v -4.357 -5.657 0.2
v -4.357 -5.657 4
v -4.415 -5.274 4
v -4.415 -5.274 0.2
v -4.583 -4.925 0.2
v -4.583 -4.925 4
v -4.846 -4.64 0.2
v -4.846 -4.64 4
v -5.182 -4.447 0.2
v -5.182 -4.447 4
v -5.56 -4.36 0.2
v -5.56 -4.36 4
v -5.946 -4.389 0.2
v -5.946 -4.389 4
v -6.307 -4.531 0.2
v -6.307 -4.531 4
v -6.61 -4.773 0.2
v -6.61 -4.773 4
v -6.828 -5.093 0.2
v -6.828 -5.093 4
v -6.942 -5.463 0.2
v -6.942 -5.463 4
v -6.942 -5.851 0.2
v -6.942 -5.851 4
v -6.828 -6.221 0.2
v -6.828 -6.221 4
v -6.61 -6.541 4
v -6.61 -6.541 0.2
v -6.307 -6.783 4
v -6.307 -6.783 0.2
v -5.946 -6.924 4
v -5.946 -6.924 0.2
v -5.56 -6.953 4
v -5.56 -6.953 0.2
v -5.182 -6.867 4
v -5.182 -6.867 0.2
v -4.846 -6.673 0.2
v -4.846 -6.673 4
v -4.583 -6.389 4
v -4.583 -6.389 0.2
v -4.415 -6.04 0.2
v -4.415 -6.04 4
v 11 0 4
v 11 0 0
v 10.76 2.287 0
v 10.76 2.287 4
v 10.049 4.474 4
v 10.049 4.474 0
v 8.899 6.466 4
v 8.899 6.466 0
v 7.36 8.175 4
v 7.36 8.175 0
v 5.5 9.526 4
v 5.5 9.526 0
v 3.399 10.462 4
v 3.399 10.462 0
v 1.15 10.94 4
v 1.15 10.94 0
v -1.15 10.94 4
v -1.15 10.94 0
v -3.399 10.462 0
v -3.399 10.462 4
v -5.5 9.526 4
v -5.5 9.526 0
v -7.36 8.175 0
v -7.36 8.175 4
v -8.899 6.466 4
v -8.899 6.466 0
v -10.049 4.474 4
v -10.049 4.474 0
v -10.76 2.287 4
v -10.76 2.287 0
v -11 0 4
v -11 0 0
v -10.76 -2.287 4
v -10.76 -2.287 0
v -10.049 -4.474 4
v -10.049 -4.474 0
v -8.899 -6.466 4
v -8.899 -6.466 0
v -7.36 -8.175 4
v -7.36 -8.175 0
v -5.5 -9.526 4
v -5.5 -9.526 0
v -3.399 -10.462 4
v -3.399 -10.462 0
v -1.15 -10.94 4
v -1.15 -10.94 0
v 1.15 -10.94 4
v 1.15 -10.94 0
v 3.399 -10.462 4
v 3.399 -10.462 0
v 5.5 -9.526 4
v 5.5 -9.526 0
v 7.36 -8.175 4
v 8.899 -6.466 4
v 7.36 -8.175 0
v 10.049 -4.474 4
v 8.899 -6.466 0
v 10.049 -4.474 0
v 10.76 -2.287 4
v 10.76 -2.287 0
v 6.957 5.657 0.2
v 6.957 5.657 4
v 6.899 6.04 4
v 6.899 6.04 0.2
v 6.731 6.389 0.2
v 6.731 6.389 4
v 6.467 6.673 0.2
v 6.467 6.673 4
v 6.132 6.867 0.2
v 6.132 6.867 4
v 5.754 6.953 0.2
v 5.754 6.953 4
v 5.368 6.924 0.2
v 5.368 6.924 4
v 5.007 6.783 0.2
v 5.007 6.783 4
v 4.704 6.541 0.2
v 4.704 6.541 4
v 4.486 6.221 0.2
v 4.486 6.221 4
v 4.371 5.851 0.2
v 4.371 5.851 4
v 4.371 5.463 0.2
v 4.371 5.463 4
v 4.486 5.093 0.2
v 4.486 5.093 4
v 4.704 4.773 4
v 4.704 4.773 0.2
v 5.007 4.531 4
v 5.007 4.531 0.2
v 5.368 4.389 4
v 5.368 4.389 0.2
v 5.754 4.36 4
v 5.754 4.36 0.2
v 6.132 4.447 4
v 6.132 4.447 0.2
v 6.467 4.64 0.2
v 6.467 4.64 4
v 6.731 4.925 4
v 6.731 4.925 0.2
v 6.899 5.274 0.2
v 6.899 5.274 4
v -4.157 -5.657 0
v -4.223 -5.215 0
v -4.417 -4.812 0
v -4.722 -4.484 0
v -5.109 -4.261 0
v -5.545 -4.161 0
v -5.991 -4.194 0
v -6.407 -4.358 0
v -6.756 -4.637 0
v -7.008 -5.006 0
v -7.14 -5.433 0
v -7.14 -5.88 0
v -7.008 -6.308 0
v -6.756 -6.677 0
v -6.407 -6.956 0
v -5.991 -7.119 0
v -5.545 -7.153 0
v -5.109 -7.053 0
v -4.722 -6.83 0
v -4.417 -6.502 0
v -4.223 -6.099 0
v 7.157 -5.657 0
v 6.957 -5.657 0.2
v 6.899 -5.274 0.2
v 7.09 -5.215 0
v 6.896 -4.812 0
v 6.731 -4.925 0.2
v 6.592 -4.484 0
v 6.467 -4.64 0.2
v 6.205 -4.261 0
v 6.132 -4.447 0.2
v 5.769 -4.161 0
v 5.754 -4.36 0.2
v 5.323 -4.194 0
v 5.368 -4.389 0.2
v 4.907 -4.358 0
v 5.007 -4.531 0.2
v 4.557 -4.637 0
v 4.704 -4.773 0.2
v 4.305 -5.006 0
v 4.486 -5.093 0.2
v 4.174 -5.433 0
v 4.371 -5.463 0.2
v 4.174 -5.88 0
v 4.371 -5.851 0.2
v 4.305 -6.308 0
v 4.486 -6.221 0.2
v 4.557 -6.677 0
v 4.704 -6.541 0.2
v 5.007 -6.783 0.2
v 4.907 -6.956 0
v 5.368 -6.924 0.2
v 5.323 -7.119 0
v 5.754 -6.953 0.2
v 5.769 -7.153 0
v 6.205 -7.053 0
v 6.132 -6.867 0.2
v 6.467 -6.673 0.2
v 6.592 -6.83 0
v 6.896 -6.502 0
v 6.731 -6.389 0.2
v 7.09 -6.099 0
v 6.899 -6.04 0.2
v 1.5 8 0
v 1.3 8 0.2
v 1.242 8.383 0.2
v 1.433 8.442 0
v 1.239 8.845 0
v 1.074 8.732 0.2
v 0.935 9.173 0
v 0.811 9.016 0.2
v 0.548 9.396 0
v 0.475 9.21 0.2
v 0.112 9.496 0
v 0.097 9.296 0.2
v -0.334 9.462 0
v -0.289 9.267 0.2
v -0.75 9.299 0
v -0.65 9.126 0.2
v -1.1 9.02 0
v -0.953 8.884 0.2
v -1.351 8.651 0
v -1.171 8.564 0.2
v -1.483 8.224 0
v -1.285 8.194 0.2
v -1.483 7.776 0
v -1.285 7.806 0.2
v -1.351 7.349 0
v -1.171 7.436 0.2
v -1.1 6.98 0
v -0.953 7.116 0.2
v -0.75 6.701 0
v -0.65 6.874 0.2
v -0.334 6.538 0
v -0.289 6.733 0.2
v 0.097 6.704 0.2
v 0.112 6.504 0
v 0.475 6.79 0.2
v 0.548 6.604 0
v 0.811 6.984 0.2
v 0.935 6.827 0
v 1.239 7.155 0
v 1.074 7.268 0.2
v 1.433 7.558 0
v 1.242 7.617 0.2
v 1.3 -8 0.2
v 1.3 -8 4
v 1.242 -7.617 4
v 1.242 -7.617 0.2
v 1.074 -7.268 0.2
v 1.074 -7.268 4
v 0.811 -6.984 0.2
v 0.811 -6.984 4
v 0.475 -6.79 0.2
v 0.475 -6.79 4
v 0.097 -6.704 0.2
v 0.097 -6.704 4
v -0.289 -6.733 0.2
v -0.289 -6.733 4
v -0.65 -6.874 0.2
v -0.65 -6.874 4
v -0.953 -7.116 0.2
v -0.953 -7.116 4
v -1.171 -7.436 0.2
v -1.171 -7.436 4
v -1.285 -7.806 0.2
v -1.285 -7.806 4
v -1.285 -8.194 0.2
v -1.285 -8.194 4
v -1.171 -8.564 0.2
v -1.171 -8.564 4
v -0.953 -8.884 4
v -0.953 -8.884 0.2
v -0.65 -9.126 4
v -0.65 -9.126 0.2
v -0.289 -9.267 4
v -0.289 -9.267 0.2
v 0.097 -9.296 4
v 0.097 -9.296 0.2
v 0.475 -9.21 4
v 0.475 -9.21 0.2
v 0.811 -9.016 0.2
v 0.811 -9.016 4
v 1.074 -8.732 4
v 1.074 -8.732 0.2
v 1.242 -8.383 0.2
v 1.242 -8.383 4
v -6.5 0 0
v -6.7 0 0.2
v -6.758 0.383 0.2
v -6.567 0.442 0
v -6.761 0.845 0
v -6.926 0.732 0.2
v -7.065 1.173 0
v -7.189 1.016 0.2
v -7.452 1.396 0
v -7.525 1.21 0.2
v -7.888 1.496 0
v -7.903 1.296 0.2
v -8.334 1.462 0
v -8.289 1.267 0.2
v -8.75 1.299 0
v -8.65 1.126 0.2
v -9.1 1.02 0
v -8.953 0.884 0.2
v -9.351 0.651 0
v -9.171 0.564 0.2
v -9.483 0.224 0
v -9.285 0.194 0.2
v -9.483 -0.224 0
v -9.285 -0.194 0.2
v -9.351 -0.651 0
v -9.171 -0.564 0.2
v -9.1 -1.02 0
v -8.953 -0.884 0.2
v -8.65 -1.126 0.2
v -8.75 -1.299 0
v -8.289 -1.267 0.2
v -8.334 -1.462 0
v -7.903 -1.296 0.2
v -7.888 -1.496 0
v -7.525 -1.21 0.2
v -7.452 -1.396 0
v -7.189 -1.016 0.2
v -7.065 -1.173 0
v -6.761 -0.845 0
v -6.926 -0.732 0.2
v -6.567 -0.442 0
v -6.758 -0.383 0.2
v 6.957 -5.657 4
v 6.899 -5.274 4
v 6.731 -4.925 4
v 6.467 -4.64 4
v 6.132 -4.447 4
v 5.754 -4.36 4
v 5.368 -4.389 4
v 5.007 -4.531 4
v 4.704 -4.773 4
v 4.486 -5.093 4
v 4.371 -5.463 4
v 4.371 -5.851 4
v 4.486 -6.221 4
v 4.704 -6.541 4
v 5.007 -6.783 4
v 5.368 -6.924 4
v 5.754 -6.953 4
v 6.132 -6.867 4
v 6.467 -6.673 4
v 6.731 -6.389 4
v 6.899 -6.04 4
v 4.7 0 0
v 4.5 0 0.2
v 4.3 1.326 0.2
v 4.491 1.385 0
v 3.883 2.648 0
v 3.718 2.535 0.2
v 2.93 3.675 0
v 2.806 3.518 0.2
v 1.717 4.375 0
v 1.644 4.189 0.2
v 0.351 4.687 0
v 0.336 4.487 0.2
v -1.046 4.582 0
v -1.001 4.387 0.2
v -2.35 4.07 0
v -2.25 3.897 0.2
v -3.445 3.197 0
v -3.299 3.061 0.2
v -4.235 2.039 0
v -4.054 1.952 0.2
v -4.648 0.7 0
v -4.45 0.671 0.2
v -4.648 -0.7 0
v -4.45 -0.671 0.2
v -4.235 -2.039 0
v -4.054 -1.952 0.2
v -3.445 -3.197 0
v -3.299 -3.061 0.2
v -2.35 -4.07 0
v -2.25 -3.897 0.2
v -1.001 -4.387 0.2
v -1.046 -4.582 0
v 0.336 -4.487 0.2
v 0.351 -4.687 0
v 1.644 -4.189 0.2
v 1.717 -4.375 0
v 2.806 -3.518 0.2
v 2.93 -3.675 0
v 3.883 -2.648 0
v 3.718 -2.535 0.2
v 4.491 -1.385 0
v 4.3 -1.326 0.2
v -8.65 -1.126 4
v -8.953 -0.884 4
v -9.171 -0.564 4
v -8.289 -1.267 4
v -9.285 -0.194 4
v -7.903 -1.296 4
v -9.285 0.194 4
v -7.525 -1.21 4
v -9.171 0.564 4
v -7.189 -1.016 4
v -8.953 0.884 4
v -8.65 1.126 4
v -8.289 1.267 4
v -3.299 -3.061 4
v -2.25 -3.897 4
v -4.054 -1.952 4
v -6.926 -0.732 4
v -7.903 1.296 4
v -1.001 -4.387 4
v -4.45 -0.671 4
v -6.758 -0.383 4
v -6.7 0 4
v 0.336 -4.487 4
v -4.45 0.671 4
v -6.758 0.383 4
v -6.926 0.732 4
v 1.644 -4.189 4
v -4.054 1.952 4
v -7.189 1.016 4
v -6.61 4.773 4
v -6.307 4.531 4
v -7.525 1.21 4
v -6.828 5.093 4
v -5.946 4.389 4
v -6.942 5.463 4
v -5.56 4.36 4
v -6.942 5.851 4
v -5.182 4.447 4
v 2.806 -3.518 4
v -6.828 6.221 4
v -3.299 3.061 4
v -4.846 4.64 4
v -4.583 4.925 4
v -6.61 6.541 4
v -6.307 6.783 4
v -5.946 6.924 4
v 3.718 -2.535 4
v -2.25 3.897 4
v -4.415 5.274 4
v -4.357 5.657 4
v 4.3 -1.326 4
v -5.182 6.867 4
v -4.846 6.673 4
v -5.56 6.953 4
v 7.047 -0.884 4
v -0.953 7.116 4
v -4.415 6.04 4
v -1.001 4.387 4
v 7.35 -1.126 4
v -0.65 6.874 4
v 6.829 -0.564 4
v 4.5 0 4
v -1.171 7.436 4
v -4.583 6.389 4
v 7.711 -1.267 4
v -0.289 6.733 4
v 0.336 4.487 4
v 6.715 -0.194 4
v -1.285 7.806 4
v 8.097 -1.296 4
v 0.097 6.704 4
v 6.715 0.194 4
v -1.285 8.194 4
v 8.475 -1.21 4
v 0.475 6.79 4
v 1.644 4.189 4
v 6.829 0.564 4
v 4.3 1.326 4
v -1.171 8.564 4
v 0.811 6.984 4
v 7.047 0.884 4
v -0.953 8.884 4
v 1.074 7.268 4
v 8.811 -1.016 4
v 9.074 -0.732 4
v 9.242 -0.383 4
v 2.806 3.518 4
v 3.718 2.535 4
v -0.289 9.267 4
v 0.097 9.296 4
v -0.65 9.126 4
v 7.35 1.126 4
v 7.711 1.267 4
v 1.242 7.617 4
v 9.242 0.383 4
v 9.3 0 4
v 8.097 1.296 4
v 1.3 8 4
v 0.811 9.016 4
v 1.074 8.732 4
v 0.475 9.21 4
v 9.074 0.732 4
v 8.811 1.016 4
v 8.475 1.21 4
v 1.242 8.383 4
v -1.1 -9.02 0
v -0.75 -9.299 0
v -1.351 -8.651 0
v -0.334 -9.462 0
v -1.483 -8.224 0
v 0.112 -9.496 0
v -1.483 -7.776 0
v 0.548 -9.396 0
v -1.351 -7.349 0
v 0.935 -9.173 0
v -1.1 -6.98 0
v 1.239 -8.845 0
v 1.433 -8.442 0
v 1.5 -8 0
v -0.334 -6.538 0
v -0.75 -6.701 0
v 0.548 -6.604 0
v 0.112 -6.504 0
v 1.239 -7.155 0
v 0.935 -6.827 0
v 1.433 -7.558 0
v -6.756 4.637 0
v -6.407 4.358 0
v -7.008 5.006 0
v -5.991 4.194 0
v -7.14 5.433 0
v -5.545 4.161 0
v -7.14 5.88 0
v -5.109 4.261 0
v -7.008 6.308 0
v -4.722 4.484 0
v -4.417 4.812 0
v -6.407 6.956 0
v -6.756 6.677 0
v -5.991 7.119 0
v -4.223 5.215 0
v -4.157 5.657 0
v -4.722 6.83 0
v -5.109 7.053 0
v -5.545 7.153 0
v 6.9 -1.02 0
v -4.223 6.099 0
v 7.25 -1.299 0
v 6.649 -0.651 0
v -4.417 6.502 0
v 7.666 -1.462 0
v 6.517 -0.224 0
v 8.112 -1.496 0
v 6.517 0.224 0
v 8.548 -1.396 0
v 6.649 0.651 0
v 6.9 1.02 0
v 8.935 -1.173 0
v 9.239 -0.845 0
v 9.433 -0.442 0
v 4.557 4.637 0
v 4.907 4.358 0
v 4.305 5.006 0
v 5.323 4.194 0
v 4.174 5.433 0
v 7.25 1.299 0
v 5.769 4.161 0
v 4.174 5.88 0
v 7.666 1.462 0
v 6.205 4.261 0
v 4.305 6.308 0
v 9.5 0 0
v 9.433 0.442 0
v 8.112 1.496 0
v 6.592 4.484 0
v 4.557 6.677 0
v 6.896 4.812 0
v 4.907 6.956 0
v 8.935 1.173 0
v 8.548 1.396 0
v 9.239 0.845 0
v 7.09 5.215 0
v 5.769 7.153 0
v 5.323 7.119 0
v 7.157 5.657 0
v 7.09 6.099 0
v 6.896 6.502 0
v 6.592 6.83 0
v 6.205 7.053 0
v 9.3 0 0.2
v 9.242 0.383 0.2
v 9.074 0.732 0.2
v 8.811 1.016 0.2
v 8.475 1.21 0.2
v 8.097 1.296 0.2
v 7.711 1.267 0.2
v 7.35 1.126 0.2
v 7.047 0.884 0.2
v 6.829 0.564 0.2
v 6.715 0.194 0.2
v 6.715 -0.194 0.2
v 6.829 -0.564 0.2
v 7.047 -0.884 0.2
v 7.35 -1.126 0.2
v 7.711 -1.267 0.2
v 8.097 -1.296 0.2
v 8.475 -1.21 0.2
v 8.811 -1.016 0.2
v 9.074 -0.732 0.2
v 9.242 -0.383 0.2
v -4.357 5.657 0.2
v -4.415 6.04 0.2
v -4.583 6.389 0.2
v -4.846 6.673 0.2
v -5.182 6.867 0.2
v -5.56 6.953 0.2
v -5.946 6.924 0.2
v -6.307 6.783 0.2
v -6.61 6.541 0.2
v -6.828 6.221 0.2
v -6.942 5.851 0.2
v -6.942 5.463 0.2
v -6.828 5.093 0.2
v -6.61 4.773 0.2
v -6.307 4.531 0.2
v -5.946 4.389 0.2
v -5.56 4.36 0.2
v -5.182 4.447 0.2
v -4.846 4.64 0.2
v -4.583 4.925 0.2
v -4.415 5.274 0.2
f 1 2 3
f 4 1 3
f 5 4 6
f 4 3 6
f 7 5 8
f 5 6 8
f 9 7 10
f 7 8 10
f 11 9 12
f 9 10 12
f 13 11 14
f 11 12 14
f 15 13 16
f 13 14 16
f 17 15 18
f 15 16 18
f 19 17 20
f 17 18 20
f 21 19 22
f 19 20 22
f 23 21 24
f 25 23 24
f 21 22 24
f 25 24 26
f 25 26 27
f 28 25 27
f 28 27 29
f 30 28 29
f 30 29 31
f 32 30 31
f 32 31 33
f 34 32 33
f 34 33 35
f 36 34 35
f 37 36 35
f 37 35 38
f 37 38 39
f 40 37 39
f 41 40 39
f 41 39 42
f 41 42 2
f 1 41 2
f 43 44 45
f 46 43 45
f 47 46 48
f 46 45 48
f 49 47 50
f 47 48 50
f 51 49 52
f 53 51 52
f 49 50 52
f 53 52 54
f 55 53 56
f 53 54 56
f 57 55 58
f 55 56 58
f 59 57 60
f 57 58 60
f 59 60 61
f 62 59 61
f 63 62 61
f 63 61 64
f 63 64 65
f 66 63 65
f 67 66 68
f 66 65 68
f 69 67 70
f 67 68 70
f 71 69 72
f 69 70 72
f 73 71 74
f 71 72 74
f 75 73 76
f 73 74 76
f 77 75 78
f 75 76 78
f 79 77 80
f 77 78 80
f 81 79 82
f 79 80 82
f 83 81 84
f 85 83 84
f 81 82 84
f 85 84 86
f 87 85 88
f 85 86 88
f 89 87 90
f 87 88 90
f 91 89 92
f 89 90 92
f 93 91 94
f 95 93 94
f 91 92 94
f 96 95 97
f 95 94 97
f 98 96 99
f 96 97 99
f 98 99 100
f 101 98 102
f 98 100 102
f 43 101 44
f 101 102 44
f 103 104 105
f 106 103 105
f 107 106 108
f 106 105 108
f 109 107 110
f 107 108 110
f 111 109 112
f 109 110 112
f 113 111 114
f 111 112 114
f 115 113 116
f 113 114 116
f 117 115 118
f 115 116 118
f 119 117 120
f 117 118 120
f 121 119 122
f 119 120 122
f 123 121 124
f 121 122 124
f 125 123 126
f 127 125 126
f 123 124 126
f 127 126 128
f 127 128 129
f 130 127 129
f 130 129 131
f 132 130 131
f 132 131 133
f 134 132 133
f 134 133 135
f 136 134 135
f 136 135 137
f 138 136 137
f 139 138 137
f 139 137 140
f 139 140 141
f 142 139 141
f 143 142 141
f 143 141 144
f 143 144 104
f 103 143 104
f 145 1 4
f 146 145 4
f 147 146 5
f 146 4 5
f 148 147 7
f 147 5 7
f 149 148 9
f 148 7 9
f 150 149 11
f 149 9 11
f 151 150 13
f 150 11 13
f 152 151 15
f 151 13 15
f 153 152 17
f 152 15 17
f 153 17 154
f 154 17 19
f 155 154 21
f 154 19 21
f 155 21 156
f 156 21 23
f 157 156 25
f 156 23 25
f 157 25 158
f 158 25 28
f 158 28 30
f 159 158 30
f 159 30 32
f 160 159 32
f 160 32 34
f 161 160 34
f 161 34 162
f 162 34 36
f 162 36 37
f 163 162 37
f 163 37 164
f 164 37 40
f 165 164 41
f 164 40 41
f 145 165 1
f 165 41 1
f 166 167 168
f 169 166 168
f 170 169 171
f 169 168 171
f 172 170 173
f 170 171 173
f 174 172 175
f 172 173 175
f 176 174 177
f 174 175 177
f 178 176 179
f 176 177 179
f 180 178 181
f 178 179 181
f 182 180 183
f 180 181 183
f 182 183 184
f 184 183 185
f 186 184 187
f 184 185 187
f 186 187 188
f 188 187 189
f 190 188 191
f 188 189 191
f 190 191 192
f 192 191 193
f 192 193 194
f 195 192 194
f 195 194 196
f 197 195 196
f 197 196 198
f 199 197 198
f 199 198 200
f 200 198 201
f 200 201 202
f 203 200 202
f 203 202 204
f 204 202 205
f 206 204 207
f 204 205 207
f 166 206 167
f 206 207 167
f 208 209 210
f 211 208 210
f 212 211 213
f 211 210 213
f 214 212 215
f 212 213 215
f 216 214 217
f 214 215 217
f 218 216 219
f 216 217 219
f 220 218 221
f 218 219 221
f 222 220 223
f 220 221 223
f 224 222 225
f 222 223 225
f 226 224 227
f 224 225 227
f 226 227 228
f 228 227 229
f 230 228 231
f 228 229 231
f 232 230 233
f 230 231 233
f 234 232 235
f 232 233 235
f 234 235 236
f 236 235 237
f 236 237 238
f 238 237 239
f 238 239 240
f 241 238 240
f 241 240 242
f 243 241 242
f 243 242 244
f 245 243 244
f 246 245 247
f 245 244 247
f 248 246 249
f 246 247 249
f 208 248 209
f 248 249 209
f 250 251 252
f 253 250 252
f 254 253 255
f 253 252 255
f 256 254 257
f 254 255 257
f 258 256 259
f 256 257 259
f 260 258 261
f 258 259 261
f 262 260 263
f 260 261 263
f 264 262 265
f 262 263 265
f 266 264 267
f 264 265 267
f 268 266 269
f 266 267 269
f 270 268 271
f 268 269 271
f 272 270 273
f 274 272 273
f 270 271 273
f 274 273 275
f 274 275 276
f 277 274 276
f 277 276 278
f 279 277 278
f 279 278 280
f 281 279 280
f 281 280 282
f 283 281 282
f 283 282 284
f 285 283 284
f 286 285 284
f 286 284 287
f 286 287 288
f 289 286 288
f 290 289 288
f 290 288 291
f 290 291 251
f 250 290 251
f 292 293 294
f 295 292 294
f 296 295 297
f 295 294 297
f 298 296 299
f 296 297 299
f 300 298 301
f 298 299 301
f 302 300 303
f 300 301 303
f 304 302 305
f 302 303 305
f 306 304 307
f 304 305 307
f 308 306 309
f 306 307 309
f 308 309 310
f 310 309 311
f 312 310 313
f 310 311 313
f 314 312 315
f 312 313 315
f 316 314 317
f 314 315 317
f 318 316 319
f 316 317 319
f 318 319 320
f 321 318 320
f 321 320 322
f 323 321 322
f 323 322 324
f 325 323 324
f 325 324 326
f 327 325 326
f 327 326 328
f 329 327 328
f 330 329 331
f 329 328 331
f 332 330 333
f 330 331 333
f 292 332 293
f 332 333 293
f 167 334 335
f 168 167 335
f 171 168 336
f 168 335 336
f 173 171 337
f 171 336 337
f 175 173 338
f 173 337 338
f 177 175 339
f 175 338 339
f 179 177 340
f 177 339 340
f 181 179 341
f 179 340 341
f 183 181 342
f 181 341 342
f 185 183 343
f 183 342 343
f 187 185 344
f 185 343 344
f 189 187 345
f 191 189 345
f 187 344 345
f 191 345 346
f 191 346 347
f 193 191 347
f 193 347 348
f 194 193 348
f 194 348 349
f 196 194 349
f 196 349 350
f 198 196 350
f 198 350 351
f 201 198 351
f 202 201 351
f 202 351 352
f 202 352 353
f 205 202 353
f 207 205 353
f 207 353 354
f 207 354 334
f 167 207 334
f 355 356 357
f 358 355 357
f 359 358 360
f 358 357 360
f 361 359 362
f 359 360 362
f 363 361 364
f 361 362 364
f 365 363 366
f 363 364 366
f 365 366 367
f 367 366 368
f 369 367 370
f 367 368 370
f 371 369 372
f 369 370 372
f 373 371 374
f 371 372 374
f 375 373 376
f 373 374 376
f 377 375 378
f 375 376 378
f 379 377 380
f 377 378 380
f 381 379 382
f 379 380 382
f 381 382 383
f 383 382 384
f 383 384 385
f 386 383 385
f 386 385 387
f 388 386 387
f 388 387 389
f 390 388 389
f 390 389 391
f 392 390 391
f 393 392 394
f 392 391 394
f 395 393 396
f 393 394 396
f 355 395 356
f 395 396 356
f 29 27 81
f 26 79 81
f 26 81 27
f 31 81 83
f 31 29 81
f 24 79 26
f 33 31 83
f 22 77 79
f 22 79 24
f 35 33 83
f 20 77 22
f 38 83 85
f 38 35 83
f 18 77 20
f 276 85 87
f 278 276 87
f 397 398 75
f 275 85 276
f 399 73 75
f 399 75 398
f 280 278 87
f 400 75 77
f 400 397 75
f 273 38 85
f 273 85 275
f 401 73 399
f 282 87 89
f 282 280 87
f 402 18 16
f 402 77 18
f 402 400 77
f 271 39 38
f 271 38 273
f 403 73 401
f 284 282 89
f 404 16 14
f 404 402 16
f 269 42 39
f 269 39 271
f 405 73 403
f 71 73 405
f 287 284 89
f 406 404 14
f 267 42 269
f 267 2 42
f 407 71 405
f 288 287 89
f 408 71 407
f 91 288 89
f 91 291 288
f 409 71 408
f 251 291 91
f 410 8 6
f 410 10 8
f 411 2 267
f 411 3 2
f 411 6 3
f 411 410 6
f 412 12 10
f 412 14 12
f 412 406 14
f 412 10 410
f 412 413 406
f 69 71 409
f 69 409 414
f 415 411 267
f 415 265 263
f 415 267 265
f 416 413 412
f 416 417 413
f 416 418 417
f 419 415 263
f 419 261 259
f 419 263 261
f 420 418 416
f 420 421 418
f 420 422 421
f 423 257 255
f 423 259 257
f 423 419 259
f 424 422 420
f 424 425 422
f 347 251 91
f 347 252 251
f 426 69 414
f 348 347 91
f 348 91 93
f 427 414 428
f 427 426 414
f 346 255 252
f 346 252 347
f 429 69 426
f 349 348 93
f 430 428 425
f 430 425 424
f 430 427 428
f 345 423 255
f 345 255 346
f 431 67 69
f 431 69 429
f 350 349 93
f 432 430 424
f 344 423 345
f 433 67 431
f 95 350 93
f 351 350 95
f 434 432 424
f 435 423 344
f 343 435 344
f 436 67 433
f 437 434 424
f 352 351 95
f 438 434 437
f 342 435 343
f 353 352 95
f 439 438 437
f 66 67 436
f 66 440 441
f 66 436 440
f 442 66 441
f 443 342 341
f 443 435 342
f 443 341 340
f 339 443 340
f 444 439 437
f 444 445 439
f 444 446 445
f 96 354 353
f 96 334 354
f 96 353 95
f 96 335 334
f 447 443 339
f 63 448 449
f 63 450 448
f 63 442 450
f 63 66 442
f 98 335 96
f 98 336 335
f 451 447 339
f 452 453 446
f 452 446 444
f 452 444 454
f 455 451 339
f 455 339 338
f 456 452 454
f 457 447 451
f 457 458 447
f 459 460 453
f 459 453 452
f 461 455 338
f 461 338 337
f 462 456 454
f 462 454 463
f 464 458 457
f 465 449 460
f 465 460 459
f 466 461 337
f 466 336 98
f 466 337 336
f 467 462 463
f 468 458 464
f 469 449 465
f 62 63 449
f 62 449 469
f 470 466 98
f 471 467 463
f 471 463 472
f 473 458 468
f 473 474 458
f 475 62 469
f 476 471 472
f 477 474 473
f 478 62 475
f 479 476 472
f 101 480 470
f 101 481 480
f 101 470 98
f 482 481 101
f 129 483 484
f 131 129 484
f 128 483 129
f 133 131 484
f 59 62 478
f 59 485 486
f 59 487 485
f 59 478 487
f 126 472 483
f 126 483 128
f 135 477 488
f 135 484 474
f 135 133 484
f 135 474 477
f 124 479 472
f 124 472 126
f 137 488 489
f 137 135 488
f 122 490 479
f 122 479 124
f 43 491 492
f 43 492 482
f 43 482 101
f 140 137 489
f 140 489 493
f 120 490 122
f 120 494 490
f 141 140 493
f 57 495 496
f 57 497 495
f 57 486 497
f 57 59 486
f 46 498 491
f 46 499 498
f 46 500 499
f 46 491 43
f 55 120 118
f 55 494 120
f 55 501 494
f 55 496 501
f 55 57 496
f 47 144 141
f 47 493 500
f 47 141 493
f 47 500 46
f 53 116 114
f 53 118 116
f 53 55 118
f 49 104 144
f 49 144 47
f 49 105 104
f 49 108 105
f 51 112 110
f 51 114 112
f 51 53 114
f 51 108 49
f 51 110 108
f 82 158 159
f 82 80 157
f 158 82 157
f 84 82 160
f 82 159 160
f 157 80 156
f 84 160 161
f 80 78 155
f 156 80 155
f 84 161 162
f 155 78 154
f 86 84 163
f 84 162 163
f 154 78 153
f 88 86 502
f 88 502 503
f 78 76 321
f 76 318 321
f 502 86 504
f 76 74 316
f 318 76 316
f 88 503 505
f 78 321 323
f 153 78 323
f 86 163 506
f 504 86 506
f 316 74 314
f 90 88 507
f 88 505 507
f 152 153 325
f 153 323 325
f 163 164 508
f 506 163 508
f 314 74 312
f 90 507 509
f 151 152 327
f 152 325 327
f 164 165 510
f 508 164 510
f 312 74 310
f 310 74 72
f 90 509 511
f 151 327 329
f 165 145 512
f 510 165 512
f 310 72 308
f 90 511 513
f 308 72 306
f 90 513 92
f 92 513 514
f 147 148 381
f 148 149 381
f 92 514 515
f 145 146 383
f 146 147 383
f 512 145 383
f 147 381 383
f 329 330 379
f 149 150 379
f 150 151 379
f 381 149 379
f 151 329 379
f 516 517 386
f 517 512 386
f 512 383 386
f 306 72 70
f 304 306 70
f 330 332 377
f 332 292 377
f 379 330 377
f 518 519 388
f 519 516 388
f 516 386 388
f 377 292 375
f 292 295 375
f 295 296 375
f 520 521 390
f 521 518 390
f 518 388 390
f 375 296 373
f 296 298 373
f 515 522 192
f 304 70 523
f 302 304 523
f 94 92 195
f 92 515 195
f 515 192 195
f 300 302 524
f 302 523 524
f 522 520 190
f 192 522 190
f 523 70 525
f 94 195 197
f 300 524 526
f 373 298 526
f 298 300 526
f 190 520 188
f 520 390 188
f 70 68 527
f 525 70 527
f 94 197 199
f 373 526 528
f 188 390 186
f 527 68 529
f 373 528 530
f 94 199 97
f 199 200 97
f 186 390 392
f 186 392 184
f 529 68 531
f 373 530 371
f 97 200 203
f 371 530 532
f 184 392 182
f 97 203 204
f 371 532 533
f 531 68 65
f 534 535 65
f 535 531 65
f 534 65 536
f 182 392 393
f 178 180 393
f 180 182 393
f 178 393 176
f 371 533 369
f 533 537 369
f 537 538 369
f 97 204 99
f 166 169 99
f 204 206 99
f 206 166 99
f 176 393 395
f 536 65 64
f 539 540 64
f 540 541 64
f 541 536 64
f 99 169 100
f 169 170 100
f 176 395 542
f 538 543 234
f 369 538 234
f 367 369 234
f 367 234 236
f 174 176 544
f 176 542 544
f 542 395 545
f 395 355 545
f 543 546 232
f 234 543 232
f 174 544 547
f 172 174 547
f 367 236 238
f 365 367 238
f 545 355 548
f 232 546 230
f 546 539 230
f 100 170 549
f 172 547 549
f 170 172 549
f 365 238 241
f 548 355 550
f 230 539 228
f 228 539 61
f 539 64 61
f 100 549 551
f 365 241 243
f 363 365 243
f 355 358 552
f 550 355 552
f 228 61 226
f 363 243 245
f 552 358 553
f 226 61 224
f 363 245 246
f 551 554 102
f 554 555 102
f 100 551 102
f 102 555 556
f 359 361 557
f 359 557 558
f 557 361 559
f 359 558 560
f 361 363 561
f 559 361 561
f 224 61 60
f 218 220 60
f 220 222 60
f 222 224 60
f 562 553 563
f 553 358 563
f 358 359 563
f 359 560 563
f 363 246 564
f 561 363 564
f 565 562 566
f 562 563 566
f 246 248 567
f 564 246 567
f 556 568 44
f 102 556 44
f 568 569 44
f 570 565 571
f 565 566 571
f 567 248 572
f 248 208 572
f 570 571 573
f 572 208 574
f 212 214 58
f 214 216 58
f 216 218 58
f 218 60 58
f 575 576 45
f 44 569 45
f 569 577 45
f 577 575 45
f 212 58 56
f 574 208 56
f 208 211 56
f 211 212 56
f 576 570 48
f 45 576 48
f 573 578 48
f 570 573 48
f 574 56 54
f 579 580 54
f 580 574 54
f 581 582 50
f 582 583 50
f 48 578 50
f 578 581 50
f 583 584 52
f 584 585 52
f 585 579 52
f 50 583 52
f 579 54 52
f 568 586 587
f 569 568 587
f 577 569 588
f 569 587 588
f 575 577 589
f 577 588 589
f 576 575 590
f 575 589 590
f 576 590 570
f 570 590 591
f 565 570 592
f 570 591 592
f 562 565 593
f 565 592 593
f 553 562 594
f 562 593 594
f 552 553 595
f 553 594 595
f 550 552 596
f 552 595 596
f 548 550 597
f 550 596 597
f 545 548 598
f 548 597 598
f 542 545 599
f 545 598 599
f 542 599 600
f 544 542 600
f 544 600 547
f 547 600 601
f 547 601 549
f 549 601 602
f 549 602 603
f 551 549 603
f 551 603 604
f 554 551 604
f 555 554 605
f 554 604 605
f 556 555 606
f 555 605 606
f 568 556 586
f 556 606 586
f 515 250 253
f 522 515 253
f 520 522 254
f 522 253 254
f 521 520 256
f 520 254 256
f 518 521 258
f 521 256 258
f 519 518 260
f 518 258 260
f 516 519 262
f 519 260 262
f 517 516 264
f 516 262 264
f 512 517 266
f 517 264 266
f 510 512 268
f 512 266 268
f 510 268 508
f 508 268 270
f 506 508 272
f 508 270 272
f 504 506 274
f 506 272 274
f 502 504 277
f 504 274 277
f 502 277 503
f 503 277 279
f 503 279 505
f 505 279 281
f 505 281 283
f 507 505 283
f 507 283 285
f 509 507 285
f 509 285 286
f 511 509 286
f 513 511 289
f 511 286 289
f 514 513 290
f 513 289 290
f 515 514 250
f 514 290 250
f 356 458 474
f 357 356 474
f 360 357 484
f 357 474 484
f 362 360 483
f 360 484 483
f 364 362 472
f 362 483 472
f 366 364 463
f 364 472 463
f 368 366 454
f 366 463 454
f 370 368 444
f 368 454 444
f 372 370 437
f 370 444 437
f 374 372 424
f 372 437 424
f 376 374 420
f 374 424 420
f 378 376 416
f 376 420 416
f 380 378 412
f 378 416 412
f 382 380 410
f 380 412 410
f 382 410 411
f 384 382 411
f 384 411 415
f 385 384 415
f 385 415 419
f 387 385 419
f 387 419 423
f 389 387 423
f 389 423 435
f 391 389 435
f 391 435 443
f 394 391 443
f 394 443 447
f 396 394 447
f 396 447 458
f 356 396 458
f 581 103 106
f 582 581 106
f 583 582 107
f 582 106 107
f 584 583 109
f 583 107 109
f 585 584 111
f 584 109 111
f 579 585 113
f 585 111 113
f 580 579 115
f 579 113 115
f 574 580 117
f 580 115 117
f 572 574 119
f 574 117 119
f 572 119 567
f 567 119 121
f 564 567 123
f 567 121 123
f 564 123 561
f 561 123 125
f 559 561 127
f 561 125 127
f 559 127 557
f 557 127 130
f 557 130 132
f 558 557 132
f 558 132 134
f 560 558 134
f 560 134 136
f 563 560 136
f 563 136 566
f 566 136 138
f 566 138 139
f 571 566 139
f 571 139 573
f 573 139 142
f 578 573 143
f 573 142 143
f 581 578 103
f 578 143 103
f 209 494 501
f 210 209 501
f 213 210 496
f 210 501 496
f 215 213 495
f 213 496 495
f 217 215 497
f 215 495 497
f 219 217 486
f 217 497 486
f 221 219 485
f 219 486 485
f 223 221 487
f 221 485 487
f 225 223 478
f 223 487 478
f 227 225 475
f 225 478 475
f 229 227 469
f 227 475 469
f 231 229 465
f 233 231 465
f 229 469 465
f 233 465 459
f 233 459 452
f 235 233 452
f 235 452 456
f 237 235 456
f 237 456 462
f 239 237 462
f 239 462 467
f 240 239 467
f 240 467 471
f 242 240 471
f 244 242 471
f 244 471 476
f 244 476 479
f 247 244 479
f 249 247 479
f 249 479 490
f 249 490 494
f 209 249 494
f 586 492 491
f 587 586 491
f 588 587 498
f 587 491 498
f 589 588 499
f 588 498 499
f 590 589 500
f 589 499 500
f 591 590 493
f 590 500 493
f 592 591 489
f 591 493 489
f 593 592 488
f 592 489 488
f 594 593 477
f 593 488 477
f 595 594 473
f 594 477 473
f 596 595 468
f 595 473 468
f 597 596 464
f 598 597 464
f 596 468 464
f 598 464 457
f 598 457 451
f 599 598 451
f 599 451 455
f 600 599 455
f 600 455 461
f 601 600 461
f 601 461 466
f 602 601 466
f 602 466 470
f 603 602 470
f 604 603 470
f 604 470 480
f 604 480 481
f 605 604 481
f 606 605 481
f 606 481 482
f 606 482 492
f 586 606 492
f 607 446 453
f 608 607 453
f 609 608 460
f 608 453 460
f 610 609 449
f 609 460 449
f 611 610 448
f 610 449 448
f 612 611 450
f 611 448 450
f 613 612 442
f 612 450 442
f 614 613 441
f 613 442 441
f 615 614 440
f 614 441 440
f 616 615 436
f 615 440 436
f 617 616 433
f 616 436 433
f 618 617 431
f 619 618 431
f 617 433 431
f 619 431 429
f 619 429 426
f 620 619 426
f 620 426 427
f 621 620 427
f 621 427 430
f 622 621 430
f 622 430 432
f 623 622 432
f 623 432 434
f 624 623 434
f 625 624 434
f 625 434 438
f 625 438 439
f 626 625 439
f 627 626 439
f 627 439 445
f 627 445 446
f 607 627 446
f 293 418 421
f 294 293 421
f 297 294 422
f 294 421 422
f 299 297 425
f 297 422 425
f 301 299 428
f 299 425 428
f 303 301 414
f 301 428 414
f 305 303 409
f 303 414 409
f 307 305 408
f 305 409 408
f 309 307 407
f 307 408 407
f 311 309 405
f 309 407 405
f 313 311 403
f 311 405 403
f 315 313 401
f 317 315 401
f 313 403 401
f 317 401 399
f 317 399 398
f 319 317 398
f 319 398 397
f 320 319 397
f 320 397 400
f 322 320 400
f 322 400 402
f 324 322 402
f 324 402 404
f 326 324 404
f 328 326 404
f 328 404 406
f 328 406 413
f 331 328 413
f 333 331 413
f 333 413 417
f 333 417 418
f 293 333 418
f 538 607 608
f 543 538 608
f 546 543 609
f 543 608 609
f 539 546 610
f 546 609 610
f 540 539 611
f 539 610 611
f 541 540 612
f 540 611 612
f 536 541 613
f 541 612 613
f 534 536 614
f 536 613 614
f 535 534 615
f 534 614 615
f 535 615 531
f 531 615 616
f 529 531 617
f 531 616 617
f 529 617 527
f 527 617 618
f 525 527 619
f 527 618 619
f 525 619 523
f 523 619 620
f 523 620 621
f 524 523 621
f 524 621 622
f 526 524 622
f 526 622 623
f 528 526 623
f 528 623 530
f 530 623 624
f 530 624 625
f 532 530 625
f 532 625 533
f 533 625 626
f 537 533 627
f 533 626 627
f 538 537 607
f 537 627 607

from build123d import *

# Parameters (mm, degrees)
SKETCH_R        = 11
PAD_DEPTH       = 4
SKETCH002_R     = 4.5
SKETCH002_R_2   = 1.3
POCKET001_DEPTH = 10
CHAMFER_SIZE    = 0.2


with BuildPart() as part:
    # Sketch → Pad (new body)
    with BuildSketch(Plane.XY):
        Circle(SKETCH_R)
    extrude(amount=PAD_DEPTH)

    # Sketch002 → Pocket001 (cut)
    with BuildSketch(Plane.XY.offset(6)):
        Circle(SKETCH002_R)
        with Locations((0, 8)):
            Circle(SKETCH002_R_2)
        with Locations((5.656854, 5.656854)):
            Circle(SKETCH002_R_2)
        with Locations((8, 0)):
            Circle(SKETCH002_R_2)
        with Locations((5.656854, -5.656854)):
            Circle(SKETCH002_R_2)
        with Locations((0, -8)):
            Circle(SKETCH002_R_2)
        with Locations((-5.656854, -5.656854)):
            Circle(SKETCH002_R_2)
        with Locations((-8, 0)):
            Circle(SKETCH002_R_2)
        with Locations((-5.656854, 5.656854)):
            Circle(SKETCH002_R_2)
    extrude(amount=-POCKET001_DEPTH, mode=Mode.SUBTRACT)

    # Chamfer
    chamfer_edges = [part.edges().sort_by_distance(p)[0] for p in [
        (4.356854, 5.656854, 0),
        (-6.956854, 5.656854, 0),
        (4.356854, -5.656854, 0),
        (-9.3, 0, 0),
        (-6.956854, -5.656854, 0),
        (-1.3, -8, 0),
        (-1.3, 8, 0),
        (-4.5, 0, 0),
        (6.7, 0, 0),
    ]]
    chamfer(chamfer_edges, length=CHAMFER_SIZE)


solid = part.part
